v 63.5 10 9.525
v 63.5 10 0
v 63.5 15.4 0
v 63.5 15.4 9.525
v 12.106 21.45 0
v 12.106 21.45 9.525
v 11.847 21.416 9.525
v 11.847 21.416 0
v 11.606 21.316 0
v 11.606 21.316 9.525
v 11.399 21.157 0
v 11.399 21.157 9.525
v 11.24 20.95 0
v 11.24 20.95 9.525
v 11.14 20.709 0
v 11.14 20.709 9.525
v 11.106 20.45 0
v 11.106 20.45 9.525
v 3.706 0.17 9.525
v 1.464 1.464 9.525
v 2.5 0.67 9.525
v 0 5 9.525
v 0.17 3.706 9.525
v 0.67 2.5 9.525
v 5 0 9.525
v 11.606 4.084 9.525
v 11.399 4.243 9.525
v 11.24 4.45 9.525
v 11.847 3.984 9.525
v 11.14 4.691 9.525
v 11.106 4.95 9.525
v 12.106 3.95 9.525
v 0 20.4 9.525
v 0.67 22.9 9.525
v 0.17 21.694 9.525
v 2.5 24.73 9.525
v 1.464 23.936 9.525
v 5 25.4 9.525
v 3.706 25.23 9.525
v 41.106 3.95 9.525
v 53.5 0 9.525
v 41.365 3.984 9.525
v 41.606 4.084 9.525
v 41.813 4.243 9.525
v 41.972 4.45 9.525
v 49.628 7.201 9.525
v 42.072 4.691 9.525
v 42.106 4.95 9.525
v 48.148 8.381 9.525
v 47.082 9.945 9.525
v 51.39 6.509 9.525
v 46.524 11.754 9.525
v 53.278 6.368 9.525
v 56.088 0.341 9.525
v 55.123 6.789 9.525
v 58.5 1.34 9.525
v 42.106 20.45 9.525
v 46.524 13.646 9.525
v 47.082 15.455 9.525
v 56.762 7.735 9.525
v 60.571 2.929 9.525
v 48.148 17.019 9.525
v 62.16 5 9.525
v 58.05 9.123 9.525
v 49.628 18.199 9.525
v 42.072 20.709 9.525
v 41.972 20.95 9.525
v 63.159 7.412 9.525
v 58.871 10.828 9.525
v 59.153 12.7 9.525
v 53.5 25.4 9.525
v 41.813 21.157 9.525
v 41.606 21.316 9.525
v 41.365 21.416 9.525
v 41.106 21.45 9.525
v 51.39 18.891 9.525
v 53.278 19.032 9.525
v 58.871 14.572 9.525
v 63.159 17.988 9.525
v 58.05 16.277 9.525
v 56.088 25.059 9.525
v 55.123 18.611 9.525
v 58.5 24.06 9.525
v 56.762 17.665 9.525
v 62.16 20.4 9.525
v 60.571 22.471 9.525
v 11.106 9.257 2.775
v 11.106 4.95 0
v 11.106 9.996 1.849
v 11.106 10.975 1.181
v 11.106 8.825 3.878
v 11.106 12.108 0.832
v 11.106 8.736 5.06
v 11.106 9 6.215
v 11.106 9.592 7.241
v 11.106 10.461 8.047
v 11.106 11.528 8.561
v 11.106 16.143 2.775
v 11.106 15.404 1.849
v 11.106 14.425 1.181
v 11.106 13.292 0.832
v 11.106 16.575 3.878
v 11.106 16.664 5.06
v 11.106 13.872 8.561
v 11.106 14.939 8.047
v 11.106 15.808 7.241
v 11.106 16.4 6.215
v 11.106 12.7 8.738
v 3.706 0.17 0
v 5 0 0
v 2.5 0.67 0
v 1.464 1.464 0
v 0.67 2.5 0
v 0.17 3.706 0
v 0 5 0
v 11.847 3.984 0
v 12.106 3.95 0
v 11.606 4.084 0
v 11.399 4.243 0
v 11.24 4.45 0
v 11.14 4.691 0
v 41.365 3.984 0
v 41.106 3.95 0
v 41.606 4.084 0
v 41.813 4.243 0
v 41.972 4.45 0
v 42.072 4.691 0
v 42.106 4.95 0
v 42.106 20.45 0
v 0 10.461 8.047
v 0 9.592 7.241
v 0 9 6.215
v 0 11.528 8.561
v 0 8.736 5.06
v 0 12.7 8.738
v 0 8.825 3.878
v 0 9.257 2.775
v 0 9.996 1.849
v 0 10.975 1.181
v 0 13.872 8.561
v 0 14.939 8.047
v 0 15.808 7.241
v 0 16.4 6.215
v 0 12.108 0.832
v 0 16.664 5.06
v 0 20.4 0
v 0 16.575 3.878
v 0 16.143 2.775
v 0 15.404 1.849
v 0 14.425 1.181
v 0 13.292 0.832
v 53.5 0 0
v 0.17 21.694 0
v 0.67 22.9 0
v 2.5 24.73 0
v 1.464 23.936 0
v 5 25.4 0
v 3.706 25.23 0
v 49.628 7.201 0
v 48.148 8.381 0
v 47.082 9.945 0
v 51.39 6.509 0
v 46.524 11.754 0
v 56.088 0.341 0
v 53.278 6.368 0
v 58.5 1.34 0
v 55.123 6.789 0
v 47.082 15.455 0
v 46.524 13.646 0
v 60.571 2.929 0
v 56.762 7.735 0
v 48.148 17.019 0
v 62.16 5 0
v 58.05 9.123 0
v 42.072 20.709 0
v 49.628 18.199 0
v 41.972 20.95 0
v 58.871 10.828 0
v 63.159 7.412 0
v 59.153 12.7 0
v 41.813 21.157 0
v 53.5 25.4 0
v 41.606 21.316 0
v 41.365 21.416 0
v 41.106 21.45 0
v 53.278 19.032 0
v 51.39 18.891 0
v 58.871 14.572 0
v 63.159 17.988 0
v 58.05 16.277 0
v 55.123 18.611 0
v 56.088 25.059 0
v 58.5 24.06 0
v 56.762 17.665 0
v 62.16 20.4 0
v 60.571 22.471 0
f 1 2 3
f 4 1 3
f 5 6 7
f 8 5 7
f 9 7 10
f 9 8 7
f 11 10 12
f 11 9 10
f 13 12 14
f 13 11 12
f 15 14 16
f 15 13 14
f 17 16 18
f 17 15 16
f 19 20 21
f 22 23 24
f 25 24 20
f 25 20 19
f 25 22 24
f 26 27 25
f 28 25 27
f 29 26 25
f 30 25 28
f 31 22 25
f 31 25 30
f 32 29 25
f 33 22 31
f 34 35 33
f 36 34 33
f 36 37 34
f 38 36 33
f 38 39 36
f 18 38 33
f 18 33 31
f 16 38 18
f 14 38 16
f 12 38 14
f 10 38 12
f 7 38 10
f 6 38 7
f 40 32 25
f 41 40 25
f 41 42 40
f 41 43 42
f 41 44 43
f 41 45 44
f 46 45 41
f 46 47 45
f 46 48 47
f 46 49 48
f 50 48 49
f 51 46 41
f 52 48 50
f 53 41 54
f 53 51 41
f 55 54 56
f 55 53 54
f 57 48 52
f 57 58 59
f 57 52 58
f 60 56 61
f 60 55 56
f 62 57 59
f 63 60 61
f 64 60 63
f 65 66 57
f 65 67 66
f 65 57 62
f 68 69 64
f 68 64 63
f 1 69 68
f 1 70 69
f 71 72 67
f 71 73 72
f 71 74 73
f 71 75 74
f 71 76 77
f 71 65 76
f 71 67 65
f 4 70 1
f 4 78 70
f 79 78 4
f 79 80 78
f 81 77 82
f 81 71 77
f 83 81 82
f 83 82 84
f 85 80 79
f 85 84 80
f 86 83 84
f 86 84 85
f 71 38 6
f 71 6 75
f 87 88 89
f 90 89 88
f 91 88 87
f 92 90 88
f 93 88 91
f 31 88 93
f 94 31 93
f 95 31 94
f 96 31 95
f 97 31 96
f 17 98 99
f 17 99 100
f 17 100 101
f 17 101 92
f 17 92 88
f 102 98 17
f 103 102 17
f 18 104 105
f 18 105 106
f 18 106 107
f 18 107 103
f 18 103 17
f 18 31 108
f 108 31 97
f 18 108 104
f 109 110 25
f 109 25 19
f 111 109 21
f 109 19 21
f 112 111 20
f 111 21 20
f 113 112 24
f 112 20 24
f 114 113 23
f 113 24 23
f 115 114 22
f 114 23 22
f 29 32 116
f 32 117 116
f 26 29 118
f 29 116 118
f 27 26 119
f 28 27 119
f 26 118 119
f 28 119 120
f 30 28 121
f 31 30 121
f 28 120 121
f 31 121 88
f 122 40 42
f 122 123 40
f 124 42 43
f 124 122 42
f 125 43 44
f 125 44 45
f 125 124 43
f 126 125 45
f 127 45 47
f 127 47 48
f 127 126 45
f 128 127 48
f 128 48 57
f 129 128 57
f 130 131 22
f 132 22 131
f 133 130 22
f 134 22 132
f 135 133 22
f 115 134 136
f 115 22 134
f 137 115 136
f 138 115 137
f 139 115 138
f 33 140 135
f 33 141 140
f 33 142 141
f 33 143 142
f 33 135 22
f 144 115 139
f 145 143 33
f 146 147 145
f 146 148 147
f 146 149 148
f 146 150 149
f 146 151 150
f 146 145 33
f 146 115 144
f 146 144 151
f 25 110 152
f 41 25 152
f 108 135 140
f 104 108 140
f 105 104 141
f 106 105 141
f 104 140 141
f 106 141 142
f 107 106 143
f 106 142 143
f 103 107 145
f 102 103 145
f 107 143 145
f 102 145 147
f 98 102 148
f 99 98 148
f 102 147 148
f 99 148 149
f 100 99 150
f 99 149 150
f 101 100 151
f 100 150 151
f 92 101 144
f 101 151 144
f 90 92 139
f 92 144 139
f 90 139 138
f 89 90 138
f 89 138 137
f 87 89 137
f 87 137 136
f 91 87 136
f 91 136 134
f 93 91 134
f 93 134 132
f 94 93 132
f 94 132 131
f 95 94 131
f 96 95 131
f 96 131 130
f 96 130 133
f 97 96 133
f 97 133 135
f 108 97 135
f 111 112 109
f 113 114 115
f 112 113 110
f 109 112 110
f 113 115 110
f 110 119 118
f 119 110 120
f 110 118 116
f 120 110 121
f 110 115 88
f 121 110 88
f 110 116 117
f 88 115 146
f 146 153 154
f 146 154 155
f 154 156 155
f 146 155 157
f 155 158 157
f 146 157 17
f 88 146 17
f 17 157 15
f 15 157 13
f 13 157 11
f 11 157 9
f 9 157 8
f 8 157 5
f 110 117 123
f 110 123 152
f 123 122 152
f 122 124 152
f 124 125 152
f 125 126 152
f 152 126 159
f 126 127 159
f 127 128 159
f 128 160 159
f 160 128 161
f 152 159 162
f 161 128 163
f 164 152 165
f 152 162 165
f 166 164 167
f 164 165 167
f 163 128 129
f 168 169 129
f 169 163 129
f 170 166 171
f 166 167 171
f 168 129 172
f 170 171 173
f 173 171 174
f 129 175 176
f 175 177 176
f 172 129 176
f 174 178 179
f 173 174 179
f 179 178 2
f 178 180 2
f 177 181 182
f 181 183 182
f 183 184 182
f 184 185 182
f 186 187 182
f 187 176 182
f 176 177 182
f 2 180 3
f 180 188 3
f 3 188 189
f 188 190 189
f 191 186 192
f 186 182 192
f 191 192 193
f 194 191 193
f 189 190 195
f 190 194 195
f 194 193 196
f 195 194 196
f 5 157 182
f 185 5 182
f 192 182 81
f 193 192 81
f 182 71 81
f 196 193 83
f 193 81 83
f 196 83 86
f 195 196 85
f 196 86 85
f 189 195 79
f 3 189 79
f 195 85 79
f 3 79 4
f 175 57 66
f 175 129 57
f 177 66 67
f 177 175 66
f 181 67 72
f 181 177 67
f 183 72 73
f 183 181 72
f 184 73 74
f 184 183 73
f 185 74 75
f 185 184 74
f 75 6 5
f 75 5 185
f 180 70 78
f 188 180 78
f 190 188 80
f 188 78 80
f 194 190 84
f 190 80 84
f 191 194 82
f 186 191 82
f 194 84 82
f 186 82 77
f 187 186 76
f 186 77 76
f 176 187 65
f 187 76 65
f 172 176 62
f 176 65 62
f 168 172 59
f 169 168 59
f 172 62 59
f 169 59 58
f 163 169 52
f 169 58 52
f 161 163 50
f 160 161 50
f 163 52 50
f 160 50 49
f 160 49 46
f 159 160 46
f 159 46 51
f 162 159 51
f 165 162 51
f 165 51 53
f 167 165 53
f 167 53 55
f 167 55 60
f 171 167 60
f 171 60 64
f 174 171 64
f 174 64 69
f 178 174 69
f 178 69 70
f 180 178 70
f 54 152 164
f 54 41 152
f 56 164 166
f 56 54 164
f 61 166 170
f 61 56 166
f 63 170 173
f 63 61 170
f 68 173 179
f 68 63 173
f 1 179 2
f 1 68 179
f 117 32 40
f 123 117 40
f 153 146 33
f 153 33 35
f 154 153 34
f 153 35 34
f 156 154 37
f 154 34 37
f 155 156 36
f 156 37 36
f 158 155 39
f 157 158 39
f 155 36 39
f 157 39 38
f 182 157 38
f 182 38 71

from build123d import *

# Parameters (mm, degrees)
SKETCH1_W           = 63.5
SKETCH1_H           = 25.4
BOSS_EXTRUDE1_DEPTH = 9.525
SKETCH5_R           = 6.35
SKETCH5_W           = 31
SKETCH5_H           = 17.5
CUT_EXTRUDE3_DEPTH  = 10.525
CUT_EXTRUDE2_REACH  = 65.5
SKETCH4_R           = 3.9751
FILLET4_R           = 10
FILLET5_R           = 5
FILLET6_R           = 1


with BuildPart() as part:
    # Sketch1 → Boss-Extrude1 (new body)
    with BuildSketch(Plane.XY):
        with Locations((31.75, 12.7)):
            Rectangle(SKETCH1_W, SKETCH1_H)
    extrude(amount=BOSS_EXTRUDE1_DEPTH)

    # Sketch5 → Cut-Extrude3 (cut, through all)
    with BuildSketch(Plane.XY.offset(9.525)):
        with Locations((52.803125, 12.7)):
            Circle(SKETCH5_R)
        with Locations((26.60625, 12.7)):
            Rectangle(SKETCH5_W, SKETCH5_H)
    extrude(amount=-CUT_EXTRUDE3_DEPTH, mode=Mode.SUBTRACT)

    # Sketch4 → Cut-Extrude2 (cut, up to next)
    with BuildSketch(Plane.ZY, mode=Mode.PRIVATE) as cut_extrude2_sk1:
        with Locations((4.7625, 12.7)):
            Circle(SKETCH4_R)
    cut_extrude2_tool1 = extrude(cut_extrude2_sk1.sketch, amount=-CUT_EXTRUDE2_REACH, mode=Mode.PRIVATE) & part.part
    add(cut_extrude2_tool1.solids().sort_by_distance((0, 12.7, 4.7625))[0], mode=Mode.SUBTRACT)

    # Fillet4
    fillet4_edges = [part.edges().sort_by_distance(p)[0] for p in [
        (63.5, 25.4, 4.7625),
        (63.5, 0, 4.7625),
    ]]
    fillet(fillet4_edges, radius=FILLET4_R)

    # Fillet5
    fillet5_edges = [part.edges().sort_by_distance(p)[0] for p in [
        (0, 25.4, 4.7625),
        (0, 0, 4.7625),
    ]]
    fillet(fillet5_edges, radius=FILLET5_R)

    # Fillet6
    fillet6_edges = [part.edges().sort_by_distance(p)[0] for p in [
        (42.10625, 21.45, 4.7625),
        (42.10625, 3.95, 4.7625),
        (11.10625, 3.95, 4.7625),
        (11.10625, 21.45, 4.7625),
    ]]
    fillet(fillet6_edges, radius=FILLET6_R)


solid = part.part
